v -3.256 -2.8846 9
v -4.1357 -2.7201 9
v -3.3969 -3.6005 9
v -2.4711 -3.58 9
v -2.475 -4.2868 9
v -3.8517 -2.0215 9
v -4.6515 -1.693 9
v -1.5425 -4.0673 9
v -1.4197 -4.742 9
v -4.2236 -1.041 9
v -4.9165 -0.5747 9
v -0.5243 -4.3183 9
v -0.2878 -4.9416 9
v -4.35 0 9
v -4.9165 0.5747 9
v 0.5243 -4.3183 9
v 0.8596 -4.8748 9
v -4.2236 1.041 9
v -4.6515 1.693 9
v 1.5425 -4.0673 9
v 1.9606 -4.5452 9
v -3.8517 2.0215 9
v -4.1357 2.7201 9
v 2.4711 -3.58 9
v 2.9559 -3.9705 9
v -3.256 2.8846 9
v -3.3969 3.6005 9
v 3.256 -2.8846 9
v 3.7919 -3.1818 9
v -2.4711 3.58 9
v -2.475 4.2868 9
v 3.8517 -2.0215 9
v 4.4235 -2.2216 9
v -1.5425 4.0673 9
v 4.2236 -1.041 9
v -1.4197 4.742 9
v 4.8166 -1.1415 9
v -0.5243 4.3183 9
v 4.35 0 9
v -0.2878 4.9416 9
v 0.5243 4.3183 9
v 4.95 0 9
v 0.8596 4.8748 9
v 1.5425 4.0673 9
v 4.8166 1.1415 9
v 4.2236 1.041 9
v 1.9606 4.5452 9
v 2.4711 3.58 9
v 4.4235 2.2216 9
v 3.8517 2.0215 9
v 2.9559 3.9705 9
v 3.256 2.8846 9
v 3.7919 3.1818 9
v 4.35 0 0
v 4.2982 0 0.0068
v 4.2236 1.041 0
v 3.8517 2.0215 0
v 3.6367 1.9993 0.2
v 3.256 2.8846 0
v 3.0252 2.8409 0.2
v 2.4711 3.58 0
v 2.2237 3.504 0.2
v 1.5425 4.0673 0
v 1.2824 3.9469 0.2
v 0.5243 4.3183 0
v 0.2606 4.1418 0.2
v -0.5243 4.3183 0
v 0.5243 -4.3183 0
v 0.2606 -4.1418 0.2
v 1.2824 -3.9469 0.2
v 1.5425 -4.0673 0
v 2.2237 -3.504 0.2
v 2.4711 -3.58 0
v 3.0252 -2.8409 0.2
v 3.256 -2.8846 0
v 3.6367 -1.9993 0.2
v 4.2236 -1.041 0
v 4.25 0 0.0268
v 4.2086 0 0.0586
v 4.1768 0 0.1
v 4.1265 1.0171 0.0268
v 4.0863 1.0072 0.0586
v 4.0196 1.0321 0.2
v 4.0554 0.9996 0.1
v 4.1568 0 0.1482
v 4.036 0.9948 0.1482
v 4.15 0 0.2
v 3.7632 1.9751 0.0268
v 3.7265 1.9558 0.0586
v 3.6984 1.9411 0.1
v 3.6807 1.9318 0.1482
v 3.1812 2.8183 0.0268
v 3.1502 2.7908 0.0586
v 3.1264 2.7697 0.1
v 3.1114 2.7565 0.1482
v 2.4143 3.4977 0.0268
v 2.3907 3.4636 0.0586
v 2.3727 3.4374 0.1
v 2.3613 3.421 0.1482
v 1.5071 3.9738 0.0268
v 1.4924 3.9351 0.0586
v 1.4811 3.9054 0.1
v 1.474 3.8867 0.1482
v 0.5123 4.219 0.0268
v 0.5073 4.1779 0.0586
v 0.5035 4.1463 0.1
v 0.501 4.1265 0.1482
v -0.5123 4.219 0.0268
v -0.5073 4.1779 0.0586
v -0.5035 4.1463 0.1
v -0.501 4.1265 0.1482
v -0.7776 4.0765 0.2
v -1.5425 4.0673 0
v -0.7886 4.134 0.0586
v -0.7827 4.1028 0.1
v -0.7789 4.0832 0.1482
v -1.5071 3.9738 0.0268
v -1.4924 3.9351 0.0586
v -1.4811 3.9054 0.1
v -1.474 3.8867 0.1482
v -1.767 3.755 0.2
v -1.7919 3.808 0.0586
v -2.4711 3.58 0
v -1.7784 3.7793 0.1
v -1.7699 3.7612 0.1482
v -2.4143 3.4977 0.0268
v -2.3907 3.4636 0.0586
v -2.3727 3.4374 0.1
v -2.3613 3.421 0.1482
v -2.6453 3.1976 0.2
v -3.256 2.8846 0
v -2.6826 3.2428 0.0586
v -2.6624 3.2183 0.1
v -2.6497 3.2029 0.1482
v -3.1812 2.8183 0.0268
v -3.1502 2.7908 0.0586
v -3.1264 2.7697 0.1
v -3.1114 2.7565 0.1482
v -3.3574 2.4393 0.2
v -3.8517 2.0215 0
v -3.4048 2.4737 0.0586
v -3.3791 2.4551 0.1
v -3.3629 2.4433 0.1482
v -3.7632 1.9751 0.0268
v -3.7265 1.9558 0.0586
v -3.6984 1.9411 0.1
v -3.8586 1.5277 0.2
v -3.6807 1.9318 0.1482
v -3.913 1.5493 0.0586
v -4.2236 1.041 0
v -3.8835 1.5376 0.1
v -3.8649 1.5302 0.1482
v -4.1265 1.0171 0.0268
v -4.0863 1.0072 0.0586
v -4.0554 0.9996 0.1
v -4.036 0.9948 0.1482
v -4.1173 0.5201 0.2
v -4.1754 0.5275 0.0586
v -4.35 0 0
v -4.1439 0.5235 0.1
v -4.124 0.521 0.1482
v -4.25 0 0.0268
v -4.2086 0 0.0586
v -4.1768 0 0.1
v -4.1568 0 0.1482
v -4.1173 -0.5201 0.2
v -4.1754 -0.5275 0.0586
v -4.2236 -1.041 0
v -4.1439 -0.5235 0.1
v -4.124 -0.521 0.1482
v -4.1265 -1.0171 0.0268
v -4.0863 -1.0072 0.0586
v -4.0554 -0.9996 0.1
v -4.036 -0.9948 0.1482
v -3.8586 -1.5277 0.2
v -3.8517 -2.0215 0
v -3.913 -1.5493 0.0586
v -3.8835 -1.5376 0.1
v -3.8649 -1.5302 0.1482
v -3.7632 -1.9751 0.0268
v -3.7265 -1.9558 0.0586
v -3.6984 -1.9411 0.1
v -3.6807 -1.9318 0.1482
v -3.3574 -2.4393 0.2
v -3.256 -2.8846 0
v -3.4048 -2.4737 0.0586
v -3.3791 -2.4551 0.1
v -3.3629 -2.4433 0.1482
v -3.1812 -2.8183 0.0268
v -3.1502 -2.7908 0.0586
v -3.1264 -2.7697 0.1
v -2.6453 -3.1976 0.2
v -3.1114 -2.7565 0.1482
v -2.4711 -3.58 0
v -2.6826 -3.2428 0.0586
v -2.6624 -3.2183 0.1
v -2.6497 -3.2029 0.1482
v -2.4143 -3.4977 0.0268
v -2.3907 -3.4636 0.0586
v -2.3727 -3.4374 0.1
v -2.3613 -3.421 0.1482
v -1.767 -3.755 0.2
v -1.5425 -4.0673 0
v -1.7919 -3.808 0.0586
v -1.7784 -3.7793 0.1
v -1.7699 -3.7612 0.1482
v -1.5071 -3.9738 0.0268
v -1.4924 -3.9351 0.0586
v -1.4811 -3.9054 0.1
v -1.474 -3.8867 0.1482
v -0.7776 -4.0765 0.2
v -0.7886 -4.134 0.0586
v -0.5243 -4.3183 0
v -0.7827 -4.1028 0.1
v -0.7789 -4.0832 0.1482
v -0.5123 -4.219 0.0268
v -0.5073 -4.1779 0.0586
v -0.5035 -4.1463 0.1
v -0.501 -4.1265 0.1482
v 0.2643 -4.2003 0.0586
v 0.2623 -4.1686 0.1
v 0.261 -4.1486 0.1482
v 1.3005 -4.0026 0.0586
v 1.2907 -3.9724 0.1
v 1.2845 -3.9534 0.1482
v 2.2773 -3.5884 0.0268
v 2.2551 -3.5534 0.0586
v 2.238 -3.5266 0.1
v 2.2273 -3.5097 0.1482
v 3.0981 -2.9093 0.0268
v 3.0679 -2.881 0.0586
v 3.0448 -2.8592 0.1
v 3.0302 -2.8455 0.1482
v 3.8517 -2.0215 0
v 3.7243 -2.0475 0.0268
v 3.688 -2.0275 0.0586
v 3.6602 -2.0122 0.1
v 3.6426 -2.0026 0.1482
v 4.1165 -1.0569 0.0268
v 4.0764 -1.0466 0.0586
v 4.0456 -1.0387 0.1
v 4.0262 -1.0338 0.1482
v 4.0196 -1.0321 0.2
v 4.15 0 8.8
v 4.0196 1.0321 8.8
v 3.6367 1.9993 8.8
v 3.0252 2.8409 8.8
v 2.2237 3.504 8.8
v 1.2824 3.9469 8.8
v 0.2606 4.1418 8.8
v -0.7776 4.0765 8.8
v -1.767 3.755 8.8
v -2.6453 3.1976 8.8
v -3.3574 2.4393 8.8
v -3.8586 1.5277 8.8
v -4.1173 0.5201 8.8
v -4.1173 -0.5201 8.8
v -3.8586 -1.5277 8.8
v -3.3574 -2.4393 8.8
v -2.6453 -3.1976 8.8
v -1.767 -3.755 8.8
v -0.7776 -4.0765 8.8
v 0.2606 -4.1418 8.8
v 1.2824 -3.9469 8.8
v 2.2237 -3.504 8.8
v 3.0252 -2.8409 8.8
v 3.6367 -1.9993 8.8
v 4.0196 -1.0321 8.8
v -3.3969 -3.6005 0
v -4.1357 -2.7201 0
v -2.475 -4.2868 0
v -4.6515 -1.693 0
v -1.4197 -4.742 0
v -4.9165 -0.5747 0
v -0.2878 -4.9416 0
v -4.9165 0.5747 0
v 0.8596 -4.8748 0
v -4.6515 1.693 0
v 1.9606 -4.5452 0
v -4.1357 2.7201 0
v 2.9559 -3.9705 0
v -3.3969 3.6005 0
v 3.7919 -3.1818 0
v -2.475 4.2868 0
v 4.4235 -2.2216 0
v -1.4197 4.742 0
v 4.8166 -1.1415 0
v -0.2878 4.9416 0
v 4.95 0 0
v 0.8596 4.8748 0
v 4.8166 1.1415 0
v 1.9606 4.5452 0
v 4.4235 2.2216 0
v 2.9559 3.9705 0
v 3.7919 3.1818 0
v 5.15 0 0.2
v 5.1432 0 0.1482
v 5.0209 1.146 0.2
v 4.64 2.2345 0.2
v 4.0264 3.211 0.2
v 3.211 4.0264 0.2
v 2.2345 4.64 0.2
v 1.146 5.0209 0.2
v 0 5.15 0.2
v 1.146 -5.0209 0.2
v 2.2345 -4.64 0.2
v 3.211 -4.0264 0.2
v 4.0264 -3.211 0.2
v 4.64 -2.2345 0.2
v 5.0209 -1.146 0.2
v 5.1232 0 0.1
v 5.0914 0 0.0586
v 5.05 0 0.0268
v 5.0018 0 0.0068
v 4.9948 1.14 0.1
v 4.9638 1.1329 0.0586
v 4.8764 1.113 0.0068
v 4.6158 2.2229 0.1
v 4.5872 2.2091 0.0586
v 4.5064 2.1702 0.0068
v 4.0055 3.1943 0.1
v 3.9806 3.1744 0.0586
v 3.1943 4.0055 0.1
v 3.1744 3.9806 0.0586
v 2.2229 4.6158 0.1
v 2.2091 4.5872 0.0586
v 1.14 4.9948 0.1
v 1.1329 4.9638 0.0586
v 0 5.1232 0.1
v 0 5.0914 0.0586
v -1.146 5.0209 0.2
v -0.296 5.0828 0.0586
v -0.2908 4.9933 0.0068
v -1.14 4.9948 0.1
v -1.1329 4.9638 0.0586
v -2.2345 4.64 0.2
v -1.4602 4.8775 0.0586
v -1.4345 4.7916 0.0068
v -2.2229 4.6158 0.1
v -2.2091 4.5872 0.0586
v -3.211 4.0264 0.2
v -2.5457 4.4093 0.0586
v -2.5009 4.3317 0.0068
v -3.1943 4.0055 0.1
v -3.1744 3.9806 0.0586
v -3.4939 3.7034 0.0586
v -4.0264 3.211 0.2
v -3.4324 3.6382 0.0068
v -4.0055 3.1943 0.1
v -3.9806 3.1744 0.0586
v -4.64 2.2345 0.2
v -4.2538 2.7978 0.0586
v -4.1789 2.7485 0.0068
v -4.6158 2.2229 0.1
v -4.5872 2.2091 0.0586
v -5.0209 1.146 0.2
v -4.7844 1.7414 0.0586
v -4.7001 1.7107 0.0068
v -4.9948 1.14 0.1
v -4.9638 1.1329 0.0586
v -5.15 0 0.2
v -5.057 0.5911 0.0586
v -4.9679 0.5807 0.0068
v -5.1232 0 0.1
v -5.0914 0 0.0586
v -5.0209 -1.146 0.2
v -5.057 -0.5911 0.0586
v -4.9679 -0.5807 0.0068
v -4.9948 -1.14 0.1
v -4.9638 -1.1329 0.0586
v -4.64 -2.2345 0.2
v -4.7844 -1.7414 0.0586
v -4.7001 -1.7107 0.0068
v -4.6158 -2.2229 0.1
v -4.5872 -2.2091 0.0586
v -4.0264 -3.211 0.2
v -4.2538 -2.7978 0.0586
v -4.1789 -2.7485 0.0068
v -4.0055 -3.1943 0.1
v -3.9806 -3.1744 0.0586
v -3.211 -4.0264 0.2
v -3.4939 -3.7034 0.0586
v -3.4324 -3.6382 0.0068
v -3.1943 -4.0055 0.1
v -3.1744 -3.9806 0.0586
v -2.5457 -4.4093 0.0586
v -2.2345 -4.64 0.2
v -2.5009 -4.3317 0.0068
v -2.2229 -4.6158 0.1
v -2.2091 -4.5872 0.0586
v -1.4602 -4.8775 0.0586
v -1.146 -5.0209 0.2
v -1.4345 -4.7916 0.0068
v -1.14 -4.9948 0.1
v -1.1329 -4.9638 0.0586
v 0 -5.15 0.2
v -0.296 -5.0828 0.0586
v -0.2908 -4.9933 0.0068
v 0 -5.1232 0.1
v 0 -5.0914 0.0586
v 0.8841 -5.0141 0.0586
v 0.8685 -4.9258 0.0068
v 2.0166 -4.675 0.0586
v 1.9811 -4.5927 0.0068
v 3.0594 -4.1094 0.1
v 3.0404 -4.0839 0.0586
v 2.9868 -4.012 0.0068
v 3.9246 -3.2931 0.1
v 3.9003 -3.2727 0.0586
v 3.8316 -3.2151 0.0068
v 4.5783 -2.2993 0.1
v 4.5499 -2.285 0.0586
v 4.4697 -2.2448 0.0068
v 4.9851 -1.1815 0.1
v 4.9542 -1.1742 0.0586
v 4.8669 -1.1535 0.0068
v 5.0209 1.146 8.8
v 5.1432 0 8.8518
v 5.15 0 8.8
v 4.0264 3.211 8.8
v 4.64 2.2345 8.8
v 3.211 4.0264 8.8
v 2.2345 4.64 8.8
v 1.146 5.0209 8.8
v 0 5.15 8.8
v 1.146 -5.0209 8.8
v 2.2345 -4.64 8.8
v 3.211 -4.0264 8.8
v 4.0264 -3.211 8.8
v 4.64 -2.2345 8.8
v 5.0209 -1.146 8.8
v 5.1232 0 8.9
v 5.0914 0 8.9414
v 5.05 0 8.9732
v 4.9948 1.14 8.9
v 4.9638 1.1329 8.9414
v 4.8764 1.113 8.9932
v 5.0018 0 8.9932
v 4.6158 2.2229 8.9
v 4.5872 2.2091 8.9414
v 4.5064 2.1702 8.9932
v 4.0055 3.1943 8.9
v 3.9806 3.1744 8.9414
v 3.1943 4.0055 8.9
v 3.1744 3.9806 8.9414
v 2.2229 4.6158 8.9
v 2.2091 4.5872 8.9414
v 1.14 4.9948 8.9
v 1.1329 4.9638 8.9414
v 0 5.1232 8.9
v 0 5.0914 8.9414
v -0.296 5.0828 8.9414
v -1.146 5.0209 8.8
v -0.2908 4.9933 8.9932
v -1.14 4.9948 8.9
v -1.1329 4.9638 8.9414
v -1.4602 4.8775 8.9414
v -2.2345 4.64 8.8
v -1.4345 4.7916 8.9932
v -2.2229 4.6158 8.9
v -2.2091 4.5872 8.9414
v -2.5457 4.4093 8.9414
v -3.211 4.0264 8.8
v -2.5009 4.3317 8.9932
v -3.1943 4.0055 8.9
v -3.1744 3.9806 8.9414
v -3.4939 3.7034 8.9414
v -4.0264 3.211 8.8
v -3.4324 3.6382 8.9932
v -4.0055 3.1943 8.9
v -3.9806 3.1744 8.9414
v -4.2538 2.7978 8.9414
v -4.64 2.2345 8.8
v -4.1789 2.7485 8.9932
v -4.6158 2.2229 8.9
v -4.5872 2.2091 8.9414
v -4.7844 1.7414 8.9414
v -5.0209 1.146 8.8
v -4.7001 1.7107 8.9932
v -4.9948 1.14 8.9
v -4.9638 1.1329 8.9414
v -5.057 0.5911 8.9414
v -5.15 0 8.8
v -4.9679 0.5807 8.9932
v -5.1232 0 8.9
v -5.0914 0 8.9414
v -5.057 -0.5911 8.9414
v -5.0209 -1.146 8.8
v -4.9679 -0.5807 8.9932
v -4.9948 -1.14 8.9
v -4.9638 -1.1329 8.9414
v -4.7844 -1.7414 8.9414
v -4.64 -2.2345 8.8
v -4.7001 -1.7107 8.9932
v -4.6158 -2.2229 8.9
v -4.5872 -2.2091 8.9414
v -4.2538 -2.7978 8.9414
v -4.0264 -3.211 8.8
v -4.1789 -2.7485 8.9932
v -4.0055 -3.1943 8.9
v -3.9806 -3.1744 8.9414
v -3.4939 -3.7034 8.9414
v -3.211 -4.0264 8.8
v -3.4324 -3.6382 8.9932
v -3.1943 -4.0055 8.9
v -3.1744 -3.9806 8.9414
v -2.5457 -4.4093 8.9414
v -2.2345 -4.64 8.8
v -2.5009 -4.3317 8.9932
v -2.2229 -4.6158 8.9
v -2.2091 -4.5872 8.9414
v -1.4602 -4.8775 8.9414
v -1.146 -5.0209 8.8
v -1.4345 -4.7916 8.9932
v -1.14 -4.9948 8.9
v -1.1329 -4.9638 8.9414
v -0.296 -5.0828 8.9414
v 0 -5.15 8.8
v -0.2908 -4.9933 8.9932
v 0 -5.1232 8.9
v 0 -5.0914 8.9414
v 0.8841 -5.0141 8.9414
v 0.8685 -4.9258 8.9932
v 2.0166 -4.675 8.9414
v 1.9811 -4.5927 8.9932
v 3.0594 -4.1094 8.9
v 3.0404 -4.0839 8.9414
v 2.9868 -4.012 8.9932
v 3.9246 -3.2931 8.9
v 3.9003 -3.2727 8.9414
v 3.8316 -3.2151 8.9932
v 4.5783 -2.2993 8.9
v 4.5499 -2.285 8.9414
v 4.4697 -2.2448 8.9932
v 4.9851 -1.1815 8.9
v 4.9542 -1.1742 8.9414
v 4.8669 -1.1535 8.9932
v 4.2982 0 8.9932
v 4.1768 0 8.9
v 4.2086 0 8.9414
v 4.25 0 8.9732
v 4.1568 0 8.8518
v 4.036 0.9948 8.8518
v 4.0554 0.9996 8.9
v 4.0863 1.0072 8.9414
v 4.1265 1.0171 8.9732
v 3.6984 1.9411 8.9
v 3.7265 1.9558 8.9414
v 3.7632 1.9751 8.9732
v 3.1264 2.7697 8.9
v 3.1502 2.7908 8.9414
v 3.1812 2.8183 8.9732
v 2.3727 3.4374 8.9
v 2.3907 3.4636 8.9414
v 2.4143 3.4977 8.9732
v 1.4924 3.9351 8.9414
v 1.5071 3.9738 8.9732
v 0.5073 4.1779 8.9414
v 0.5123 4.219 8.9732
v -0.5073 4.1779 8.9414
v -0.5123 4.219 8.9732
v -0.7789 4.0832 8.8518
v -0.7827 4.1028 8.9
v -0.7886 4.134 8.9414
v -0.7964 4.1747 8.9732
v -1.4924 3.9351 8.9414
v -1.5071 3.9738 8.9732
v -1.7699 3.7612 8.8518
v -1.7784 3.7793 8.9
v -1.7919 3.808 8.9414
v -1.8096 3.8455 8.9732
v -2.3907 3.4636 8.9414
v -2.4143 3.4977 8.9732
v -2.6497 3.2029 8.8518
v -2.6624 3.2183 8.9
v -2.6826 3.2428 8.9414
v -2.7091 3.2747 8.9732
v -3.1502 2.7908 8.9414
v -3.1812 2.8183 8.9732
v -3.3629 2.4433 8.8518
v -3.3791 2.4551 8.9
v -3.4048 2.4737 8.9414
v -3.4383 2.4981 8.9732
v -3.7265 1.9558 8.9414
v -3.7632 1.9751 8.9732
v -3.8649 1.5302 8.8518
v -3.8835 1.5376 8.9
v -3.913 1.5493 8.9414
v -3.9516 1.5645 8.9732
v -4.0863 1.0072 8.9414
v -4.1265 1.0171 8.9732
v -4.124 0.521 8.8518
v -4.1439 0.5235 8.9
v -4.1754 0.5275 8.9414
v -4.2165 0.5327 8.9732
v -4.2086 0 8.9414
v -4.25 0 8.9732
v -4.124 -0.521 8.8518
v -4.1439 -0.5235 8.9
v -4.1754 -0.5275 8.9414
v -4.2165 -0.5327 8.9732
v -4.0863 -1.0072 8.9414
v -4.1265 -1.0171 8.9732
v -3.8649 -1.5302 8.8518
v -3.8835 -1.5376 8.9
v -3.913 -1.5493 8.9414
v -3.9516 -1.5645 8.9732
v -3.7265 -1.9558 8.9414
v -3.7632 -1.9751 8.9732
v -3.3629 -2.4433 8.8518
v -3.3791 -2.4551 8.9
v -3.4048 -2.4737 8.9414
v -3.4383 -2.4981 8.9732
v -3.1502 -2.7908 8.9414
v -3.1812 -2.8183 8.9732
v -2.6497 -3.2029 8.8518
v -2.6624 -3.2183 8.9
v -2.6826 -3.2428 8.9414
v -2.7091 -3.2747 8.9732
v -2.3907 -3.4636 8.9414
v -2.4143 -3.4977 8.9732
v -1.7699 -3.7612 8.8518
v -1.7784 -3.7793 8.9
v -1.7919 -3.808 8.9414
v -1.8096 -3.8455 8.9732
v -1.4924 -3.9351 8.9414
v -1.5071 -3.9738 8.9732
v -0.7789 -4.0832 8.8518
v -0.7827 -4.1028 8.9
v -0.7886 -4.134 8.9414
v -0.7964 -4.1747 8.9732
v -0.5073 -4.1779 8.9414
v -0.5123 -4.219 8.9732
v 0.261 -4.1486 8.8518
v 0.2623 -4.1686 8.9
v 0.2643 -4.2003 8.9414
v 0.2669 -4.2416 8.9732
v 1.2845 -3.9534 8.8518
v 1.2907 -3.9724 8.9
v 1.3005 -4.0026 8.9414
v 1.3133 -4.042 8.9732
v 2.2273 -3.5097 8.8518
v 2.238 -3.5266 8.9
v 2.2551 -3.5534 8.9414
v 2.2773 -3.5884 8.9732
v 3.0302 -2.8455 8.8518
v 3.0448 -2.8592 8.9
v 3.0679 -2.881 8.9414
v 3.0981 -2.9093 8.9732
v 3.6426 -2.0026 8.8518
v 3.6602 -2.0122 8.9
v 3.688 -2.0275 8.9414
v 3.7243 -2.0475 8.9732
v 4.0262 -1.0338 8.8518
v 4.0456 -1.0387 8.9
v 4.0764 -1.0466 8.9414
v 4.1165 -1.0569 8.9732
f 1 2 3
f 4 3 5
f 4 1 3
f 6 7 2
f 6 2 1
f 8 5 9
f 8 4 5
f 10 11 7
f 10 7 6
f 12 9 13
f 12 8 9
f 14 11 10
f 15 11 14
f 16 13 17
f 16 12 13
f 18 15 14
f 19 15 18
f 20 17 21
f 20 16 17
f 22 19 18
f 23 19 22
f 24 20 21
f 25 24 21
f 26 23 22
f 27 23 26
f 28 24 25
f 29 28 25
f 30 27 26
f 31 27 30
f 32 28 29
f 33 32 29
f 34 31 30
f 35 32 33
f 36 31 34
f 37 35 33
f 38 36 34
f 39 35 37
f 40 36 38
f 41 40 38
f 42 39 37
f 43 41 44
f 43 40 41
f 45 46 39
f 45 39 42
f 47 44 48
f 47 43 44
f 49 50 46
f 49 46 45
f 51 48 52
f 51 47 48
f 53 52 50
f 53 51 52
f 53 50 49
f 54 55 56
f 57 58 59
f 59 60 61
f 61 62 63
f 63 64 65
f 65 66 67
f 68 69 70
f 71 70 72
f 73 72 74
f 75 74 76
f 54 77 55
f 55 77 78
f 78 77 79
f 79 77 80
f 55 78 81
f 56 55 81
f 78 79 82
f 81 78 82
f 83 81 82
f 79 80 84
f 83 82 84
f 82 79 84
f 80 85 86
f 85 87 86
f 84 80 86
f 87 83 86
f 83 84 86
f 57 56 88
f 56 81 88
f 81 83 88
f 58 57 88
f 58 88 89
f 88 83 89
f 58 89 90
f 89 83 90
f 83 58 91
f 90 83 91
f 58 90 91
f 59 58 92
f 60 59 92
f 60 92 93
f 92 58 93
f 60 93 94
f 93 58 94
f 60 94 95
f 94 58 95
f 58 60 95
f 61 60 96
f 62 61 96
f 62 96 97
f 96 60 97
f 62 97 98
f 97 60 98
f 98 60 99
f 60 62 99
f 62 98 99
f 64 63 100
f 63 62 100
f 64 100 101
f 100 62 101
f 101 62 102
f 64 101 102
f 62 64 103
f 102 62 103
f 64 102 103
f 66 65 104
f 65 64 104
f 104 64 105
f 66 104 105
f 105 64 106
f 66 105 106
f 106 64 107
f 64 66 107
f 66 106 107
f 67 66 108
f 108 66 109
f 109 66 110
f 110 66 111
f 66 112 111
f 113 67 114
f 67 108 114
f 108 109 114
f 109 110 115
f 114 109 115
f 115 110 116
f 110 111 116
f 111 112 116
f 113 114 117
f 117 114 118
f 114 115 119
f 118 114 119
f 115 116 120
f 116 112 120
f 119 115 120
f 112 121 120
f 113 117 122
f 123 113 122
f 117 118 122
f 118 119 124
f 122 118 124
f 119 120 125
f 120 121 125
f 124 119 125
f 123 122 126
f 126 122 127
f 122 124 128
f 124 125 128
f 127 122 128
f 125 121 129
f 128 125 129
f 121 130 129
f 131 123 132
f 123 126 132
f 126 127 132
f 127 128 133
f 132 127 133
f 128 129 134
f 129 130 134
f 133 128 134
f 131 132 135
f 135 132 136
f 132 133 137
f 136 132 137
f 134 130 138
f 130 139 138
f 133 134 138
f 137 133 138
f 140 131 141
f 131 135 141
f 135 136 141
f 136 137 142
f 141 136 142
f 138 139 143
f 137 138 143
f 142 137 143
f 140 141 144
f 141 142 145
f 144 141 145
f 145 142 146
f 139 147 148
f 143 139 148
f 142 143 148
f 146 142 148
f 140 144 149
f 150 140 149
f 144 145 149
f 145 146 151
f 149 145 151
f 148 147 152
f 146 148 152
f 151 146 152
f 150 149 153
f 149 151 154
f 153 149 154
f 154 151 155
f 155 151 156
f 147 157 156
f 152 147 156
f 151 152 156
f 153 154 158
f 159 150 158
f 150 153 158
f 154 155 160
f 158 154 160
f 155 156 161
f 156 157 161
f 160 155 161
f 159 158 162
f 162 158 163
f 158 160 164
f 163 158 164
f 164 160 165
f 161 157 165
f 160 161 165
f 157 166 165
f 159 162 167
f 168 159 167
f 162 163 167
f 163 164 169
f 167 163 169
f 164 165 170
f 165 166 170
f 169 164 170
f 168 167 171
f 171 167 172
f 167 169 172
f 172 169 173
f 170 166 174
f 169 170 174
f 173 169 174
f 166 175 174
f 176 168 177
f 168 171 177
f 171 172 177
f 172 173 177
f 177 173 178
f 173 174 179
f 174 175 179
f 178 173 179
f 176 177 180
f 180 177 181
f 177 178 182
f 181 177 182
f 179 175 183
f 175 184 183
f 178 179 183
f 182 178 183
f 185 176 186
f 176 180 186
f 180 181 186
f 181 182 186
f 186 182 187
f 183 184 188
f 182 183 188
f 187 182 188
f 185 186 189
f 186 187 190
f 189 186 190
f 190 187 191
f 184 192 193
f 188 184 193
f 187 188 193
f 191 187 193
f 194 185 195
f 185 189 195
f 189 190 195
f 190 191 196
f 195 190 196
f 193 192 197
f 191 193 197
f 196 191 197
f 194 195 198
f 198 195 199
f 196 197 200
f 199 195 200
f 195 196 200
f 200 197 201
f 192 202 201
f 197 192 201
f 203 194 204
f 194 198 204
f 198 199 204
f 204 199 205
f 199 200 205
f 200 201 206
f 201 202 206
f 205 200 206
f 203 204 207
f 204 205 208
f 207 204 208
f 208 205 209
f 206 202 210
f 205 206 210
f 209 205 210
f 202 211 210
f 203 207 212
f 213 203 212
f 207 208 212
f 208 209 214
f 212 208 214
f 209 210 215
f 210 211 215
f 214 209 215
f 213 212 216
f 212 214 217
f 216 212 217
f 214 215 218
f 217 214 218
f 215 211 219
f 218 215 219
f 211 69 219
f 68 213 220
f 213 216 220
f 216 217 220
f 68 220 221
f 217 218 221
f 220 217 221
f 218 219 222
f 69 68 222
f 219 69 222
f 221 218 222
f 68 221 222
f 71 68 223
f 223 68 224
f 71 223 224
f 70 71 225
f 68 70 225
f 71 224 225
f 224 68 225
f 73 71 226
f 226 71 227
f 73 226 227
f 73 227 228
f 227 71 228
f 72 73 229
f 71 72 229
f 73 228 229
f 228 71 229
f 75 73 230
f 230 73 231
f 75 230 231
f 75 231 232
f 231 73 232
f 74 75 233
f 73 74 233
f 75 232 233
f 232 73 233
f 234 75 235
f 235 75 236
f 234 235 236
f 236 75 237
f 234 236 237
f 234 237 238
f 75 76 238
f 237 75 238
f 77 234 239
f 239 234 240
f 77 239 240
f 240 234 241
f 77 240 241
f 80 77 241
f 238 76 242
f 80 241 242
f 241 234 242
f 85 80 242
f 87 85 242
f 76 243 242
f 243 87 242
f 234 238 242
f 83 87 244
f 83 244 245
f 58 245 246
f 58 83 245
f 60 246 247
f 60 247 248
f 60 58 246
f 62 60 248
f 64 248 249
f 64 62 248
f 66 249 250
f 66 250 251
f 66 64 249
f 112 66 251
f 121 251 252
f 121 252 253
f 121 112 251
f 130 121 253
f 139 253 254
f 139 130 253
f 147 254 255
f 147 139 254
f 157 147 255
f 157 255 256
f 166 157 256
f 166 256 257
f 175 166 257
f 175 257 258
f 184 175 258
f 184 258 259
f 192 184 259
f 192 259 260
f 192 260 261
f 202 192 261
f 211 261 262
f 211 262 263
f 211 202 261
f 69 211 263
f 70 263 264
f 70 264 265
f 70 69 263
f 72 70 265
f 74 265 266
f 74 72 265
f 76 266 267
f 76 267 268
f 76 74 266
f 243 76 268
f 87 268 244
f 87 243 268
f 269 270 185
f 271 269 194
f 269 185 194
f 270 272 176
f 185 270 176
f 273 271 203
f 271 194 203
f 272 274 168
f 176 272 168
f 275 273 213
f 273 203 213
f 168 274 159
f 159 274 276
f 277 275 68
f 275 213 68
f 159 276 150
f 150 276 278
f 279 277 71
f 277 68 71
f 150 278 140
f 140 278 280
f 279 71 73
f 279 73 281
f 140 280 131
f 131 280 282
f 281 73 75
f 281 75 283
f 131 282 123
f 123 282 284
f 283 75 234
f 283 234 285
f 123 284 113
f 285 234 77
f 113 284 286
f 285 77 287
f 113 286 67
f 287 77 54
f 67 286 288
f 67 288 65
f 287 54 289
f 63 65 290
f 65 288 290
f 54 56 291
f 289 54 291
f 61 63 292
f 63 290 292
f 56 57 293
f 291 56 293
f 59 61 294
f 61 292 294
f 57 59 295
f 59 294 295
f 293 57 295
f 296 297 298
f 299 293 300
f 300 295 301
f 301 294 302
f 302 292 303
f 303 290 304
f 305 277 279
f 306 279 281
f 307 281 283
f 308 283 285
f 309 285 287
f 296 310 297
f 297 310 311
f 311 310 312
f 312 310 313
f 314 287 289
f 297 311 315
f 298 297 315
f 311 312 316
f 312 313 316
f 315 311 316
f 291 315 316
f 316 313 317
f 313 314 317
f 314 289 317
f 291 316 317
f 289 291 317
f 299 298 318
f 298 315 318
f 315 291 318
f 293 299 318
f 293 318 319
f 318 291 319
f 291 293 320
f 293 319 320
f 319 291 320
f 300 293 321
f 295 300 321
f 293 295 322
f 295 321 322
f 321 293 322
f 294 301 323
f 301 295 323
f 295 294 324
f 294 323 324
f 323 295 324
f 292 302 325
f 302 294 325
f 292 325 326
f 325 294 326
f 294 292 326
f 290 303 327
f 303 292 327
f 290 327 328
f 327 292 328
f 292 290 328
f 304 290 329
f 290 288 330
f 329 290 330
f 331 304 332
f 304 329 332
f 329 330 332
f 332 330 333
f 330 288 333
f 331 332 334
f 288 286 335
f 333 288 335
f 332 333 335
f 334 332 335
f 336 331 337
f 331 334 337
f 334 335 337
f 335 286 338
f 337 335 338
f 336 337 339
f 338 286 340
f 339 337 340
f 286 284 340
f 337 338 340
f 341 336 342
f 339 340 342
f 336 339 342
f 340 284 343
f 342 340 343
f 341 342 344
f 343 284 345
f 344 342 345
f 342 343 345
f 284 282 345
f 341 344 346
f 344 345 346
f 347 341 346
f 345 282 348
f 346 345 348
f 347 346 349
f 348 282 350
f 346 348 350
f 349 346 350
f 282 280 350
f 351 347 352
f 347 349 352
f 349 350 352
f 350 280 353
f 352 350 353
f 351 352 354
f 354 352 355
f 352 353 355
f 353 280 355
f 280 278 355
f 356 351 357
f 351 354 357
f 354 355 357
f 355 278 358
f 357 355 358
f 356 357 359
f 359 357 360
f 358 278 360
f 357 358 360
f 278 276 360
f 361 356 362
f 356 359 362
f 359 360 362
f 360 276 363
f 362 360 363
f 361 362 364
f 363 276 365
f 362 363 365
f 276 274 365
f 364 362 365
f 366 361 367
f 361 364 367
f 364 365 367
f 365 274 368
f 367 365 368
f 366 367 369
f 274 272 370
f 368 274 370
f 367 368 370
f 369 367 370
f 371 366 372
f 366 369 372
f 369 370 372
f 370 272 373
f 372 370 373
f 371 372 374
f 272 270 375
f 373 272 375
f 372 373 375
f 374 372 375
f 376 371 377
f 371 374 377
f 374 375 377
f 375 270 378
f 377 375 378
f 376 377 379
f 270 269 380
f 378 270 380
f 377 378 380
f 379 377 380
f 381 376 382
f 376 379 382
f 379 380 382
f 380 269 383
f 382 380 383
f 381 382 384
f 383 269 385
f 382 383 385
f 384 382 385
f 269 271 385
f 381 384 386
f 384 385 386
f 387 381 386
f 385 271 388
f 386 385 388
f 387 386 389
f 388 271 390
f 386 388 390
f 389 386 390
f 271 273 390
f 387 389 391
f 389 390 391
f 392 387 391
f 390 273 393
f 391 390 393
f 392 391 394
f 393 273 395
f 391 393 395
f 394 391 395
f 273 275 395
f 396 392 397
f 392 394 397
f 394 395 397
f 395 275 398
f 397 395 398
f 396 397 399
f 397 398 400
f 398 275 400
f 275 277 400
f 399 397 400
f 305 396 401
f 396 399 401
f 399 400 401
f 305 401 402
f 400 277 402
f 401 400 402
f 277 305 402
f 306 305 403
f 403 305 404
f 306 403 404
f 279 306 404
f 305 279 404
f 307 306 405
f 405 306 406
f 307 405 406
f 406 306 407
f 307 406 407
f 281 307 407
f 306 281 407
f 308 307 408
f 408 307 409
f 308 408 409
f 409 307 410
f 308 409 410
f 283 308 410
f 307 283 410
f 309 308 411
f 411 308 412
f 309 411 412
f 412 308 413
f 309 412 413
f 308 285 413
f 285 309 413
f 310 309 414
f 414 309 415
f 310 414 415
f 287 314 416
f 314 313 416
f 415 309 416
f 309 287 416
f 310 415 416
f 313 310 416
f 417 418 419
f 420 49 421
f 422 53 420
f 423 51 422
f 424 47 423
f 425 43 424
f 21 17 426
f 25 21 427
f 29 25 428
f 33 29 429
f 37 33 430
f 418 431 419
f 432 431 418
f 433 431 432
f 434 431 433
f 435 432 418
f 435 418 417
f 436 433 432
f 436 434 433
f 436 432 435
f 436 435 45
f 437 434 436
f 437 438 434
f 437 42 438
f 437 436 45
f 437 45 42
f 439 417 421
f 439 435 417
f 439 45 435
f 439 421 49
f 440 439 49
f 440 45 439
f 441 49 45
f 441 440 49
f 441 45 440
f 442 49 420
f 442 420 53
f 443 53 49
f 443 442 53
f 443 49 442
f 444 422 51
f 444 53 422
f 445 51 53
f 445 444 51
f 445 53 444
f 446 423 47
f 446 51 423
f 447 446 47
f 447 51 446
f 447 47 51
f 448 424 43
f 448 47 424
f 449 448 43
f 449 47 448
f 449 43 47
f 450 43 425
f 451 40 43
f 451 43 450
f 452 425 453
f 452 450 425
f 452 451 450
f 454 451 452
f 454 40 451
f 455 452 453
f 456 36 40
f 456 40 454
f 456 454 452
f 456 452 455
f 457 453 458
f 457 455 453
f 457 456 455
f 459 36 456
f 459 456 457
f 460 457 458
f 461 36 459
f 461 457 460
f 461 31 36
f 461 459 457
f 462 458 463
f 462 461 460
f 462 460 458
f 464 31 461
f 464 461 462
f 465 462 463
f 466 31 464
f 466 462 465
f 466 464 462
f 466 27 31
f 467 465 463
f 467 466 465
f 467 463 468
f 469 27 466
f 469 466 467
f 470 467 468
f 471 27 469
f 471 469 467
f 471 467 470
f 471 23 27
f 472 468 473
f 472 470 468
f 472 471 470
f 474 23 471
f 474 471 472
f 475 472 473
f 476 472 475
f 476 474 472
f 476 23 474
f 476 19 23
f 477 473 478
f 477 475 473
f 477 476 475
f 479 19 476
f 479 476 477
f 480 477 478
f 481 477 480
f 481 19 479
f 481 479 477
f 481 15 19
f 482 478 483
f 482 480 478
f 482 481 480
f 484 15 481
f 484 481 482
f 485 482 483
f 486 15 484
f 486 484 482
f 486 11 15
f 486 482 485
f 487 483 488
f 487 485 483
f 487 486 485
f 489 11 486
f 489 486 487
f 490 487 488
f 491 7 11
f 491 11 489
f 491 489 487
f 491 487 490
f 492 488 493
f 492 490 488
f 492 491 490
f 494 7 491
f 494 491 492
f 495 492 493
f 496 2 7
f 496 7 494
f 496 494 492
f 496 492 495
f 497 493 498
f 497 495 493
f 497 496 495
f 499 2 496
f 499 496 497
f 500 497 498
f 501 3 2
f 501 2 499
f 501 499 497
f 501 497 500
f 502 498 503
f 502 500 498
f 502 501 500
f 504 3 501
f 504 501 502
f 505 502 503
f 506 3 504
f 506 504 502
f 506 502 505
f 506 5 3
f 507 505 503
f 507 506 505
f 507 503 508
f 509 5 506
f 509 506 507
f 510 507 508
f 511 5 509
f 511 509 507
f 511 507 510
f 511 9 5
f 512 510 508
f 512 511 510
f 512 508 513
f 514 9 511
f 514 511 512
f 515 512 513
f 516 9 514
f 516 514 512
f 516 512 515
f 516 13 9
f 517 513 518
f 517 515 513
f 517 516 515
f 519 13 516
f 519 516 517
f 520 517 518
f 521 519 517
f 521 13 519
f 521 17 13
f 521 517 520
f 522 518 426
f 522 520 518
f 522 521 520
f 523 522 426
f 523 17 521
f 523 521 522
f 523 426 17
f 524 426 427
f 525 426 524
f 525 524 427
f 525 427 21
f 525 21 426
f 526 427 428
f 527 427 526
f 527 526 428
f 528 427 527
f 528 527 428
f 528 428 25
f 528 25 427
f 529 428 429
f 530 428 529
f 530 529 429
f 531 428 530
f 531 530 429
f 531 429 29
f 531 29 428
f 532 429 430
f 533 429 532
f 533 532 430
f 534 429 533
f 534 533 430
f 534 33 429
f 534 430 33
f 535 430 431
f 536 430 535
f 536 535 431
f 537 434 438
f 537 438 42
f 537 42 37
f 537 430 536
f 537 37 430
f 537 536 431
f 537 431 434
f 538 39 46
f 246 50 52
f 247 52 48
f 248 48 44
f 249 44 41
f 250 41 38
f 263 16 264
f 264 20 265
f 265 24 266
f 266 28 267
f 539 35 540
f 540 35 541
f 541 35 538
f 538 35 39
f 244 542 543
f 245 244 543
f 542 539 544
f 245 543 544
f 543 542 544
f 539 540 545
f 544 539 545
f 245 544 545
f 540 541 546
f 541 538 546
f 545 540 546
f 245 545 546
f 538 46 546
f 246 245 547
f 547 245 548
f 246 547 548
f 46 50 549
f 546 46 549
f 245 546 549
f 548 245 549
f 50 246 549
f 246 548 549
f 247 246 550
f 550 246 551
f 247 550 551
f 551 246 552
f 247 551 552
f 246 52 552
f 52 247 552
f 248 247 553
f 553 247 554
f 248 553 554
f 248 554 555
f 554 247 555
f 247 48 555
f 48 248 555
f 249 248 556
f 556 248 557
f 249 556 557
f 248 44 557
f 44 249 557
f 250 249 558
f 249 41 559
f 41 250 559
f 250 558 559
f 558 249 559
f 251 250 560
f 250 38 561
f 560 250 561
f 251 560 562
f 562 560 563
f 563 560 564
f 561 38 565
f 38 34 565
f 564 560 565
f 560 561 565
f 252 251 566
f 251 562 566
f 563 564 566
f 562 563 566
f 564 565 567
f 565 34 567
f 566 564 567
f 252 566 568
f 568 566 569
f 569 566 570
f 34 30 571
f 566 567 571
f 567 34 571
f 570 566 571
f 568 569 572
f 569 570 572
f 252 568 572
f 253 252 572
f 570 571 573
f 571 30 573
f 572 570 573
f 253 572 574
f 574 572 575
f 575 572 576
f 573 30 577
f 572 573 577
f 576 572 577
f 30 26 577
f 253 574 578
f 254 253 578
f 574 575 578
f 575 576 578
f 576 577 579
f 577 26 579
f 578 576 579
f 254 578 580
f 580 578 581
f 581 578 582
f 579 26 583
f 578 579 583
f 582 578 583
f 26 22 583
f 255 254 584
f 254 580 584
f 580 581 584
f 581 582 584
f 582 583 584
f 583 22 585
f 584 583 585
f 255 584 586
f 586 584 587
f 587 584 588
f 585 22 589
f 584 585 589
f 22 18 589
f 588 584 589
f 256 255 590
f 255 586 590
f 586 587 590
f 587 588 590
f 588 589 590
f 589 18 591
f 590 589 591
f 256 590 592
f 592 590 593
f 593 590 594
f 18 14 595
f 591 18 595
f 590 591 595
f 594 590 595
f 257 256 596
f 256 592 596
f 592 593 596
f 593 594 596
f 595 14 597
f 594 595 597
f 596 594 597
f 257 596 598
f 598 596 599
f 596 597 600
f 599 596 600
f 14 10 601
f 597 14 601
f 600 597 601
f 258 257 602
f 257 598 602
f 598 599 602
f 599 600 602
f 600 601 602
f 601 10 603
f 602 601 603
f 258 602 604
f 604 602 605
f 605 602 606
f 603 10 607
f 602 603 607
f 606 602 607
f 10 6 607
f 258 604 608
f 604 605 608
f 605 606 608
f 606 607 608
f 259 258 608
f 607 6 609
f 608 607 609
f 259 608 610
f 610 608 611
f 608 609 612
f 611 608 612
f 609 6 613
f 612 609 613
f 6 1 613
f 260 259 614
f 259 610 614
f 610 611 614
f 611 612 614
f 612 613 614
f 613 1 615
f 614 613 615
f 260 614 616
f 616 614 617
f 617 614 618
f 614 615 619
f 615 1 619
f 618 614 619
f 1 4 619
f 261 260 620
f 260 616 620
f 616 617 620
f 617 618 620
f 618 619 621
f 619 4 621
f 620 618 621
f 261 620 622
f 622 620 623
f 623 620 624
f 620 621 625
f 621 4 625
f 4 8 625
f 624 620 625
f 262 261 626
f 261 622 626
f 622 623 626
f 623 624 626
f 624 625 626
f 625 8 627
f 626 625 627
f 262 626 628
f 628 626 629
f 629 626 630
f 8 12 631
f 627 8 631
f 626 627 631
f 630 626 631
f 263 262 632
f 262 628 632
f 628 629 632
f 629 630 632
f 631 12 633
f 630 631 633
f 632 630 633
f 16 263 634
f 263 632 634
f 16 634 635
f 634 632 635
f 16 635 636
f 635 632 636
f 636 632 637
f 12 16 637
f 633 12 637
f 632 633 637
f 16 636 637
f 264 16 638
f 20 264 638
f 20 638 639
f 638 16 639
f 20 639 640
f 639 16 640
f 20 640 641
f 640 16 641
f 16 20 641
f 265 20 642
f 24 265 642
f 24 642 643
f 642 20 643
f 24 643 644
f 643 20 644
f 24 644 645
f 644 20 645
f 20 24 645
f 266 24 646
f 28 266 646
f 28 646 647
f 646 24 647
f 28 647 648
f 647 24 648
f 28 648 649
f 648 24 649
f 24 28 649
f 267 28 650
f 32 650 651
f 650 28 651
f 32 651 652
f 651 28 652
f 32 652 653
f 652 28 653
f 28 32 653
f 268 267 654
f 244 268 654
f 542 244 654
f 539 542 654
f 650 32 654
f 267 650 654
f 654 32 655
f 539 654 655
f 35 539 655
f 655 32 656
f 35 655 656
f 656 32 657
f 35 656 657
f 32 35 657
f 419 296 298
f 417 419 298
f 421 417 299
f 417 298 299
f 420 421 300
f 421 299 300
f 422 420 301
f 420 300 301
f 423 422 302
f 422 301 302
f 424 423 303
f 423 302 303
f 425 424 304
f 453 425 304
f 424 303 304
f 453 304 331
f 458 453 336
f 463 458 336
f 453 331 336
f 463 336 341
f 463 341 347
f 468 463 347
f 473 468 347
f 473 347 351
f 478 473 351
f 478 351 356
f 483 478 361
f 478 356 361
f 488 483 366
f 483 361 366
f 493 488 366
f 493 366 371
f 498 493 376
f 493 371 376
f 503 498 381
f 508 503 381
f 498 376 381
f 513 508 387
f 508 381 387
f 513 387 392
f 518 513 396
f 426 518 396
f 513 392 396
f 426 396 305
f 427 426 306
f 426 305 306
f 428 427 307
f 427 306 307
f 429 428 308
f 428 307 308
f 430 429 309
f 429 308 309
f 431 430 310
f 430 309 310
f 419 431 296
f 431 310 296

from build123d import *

# Parameters (mm, degrees)
SKETCH_R    = 5.15
SKETCH_R_2  = 4.15
PAD_DEPTH   = 9
FILLET_R    = 0.2
FILLET001_R = 0.2


with BuildPart() as part:
    # Sketch → Pad (new body)
    with BuildSketch(Plane.XY):
        Circle(SKETCH_R)
        Circle(SKETCH_R_2, mode=Mode.SUBTRACT)
    extrude(amount=PAD_DEPTH)

    # Fillet
    fillet_edges = [part.edges().sort_by_distance(p)[0] for p in [
        (-5.15, 0, 9),
        (-4.15, 0, 9),
    ]]
    fillet(fillet_edges, radius=FILLET_R)

    # Fillet001
    fillet001_edges = [part.edges().sort_by_distance(p)[0] for p in [
        (-5.15, 0, 0),
        (-4.15, 0, 0),
    ]]
    fillet(fillet001_edges, radius=FILLET001_R)


solid = part.part
